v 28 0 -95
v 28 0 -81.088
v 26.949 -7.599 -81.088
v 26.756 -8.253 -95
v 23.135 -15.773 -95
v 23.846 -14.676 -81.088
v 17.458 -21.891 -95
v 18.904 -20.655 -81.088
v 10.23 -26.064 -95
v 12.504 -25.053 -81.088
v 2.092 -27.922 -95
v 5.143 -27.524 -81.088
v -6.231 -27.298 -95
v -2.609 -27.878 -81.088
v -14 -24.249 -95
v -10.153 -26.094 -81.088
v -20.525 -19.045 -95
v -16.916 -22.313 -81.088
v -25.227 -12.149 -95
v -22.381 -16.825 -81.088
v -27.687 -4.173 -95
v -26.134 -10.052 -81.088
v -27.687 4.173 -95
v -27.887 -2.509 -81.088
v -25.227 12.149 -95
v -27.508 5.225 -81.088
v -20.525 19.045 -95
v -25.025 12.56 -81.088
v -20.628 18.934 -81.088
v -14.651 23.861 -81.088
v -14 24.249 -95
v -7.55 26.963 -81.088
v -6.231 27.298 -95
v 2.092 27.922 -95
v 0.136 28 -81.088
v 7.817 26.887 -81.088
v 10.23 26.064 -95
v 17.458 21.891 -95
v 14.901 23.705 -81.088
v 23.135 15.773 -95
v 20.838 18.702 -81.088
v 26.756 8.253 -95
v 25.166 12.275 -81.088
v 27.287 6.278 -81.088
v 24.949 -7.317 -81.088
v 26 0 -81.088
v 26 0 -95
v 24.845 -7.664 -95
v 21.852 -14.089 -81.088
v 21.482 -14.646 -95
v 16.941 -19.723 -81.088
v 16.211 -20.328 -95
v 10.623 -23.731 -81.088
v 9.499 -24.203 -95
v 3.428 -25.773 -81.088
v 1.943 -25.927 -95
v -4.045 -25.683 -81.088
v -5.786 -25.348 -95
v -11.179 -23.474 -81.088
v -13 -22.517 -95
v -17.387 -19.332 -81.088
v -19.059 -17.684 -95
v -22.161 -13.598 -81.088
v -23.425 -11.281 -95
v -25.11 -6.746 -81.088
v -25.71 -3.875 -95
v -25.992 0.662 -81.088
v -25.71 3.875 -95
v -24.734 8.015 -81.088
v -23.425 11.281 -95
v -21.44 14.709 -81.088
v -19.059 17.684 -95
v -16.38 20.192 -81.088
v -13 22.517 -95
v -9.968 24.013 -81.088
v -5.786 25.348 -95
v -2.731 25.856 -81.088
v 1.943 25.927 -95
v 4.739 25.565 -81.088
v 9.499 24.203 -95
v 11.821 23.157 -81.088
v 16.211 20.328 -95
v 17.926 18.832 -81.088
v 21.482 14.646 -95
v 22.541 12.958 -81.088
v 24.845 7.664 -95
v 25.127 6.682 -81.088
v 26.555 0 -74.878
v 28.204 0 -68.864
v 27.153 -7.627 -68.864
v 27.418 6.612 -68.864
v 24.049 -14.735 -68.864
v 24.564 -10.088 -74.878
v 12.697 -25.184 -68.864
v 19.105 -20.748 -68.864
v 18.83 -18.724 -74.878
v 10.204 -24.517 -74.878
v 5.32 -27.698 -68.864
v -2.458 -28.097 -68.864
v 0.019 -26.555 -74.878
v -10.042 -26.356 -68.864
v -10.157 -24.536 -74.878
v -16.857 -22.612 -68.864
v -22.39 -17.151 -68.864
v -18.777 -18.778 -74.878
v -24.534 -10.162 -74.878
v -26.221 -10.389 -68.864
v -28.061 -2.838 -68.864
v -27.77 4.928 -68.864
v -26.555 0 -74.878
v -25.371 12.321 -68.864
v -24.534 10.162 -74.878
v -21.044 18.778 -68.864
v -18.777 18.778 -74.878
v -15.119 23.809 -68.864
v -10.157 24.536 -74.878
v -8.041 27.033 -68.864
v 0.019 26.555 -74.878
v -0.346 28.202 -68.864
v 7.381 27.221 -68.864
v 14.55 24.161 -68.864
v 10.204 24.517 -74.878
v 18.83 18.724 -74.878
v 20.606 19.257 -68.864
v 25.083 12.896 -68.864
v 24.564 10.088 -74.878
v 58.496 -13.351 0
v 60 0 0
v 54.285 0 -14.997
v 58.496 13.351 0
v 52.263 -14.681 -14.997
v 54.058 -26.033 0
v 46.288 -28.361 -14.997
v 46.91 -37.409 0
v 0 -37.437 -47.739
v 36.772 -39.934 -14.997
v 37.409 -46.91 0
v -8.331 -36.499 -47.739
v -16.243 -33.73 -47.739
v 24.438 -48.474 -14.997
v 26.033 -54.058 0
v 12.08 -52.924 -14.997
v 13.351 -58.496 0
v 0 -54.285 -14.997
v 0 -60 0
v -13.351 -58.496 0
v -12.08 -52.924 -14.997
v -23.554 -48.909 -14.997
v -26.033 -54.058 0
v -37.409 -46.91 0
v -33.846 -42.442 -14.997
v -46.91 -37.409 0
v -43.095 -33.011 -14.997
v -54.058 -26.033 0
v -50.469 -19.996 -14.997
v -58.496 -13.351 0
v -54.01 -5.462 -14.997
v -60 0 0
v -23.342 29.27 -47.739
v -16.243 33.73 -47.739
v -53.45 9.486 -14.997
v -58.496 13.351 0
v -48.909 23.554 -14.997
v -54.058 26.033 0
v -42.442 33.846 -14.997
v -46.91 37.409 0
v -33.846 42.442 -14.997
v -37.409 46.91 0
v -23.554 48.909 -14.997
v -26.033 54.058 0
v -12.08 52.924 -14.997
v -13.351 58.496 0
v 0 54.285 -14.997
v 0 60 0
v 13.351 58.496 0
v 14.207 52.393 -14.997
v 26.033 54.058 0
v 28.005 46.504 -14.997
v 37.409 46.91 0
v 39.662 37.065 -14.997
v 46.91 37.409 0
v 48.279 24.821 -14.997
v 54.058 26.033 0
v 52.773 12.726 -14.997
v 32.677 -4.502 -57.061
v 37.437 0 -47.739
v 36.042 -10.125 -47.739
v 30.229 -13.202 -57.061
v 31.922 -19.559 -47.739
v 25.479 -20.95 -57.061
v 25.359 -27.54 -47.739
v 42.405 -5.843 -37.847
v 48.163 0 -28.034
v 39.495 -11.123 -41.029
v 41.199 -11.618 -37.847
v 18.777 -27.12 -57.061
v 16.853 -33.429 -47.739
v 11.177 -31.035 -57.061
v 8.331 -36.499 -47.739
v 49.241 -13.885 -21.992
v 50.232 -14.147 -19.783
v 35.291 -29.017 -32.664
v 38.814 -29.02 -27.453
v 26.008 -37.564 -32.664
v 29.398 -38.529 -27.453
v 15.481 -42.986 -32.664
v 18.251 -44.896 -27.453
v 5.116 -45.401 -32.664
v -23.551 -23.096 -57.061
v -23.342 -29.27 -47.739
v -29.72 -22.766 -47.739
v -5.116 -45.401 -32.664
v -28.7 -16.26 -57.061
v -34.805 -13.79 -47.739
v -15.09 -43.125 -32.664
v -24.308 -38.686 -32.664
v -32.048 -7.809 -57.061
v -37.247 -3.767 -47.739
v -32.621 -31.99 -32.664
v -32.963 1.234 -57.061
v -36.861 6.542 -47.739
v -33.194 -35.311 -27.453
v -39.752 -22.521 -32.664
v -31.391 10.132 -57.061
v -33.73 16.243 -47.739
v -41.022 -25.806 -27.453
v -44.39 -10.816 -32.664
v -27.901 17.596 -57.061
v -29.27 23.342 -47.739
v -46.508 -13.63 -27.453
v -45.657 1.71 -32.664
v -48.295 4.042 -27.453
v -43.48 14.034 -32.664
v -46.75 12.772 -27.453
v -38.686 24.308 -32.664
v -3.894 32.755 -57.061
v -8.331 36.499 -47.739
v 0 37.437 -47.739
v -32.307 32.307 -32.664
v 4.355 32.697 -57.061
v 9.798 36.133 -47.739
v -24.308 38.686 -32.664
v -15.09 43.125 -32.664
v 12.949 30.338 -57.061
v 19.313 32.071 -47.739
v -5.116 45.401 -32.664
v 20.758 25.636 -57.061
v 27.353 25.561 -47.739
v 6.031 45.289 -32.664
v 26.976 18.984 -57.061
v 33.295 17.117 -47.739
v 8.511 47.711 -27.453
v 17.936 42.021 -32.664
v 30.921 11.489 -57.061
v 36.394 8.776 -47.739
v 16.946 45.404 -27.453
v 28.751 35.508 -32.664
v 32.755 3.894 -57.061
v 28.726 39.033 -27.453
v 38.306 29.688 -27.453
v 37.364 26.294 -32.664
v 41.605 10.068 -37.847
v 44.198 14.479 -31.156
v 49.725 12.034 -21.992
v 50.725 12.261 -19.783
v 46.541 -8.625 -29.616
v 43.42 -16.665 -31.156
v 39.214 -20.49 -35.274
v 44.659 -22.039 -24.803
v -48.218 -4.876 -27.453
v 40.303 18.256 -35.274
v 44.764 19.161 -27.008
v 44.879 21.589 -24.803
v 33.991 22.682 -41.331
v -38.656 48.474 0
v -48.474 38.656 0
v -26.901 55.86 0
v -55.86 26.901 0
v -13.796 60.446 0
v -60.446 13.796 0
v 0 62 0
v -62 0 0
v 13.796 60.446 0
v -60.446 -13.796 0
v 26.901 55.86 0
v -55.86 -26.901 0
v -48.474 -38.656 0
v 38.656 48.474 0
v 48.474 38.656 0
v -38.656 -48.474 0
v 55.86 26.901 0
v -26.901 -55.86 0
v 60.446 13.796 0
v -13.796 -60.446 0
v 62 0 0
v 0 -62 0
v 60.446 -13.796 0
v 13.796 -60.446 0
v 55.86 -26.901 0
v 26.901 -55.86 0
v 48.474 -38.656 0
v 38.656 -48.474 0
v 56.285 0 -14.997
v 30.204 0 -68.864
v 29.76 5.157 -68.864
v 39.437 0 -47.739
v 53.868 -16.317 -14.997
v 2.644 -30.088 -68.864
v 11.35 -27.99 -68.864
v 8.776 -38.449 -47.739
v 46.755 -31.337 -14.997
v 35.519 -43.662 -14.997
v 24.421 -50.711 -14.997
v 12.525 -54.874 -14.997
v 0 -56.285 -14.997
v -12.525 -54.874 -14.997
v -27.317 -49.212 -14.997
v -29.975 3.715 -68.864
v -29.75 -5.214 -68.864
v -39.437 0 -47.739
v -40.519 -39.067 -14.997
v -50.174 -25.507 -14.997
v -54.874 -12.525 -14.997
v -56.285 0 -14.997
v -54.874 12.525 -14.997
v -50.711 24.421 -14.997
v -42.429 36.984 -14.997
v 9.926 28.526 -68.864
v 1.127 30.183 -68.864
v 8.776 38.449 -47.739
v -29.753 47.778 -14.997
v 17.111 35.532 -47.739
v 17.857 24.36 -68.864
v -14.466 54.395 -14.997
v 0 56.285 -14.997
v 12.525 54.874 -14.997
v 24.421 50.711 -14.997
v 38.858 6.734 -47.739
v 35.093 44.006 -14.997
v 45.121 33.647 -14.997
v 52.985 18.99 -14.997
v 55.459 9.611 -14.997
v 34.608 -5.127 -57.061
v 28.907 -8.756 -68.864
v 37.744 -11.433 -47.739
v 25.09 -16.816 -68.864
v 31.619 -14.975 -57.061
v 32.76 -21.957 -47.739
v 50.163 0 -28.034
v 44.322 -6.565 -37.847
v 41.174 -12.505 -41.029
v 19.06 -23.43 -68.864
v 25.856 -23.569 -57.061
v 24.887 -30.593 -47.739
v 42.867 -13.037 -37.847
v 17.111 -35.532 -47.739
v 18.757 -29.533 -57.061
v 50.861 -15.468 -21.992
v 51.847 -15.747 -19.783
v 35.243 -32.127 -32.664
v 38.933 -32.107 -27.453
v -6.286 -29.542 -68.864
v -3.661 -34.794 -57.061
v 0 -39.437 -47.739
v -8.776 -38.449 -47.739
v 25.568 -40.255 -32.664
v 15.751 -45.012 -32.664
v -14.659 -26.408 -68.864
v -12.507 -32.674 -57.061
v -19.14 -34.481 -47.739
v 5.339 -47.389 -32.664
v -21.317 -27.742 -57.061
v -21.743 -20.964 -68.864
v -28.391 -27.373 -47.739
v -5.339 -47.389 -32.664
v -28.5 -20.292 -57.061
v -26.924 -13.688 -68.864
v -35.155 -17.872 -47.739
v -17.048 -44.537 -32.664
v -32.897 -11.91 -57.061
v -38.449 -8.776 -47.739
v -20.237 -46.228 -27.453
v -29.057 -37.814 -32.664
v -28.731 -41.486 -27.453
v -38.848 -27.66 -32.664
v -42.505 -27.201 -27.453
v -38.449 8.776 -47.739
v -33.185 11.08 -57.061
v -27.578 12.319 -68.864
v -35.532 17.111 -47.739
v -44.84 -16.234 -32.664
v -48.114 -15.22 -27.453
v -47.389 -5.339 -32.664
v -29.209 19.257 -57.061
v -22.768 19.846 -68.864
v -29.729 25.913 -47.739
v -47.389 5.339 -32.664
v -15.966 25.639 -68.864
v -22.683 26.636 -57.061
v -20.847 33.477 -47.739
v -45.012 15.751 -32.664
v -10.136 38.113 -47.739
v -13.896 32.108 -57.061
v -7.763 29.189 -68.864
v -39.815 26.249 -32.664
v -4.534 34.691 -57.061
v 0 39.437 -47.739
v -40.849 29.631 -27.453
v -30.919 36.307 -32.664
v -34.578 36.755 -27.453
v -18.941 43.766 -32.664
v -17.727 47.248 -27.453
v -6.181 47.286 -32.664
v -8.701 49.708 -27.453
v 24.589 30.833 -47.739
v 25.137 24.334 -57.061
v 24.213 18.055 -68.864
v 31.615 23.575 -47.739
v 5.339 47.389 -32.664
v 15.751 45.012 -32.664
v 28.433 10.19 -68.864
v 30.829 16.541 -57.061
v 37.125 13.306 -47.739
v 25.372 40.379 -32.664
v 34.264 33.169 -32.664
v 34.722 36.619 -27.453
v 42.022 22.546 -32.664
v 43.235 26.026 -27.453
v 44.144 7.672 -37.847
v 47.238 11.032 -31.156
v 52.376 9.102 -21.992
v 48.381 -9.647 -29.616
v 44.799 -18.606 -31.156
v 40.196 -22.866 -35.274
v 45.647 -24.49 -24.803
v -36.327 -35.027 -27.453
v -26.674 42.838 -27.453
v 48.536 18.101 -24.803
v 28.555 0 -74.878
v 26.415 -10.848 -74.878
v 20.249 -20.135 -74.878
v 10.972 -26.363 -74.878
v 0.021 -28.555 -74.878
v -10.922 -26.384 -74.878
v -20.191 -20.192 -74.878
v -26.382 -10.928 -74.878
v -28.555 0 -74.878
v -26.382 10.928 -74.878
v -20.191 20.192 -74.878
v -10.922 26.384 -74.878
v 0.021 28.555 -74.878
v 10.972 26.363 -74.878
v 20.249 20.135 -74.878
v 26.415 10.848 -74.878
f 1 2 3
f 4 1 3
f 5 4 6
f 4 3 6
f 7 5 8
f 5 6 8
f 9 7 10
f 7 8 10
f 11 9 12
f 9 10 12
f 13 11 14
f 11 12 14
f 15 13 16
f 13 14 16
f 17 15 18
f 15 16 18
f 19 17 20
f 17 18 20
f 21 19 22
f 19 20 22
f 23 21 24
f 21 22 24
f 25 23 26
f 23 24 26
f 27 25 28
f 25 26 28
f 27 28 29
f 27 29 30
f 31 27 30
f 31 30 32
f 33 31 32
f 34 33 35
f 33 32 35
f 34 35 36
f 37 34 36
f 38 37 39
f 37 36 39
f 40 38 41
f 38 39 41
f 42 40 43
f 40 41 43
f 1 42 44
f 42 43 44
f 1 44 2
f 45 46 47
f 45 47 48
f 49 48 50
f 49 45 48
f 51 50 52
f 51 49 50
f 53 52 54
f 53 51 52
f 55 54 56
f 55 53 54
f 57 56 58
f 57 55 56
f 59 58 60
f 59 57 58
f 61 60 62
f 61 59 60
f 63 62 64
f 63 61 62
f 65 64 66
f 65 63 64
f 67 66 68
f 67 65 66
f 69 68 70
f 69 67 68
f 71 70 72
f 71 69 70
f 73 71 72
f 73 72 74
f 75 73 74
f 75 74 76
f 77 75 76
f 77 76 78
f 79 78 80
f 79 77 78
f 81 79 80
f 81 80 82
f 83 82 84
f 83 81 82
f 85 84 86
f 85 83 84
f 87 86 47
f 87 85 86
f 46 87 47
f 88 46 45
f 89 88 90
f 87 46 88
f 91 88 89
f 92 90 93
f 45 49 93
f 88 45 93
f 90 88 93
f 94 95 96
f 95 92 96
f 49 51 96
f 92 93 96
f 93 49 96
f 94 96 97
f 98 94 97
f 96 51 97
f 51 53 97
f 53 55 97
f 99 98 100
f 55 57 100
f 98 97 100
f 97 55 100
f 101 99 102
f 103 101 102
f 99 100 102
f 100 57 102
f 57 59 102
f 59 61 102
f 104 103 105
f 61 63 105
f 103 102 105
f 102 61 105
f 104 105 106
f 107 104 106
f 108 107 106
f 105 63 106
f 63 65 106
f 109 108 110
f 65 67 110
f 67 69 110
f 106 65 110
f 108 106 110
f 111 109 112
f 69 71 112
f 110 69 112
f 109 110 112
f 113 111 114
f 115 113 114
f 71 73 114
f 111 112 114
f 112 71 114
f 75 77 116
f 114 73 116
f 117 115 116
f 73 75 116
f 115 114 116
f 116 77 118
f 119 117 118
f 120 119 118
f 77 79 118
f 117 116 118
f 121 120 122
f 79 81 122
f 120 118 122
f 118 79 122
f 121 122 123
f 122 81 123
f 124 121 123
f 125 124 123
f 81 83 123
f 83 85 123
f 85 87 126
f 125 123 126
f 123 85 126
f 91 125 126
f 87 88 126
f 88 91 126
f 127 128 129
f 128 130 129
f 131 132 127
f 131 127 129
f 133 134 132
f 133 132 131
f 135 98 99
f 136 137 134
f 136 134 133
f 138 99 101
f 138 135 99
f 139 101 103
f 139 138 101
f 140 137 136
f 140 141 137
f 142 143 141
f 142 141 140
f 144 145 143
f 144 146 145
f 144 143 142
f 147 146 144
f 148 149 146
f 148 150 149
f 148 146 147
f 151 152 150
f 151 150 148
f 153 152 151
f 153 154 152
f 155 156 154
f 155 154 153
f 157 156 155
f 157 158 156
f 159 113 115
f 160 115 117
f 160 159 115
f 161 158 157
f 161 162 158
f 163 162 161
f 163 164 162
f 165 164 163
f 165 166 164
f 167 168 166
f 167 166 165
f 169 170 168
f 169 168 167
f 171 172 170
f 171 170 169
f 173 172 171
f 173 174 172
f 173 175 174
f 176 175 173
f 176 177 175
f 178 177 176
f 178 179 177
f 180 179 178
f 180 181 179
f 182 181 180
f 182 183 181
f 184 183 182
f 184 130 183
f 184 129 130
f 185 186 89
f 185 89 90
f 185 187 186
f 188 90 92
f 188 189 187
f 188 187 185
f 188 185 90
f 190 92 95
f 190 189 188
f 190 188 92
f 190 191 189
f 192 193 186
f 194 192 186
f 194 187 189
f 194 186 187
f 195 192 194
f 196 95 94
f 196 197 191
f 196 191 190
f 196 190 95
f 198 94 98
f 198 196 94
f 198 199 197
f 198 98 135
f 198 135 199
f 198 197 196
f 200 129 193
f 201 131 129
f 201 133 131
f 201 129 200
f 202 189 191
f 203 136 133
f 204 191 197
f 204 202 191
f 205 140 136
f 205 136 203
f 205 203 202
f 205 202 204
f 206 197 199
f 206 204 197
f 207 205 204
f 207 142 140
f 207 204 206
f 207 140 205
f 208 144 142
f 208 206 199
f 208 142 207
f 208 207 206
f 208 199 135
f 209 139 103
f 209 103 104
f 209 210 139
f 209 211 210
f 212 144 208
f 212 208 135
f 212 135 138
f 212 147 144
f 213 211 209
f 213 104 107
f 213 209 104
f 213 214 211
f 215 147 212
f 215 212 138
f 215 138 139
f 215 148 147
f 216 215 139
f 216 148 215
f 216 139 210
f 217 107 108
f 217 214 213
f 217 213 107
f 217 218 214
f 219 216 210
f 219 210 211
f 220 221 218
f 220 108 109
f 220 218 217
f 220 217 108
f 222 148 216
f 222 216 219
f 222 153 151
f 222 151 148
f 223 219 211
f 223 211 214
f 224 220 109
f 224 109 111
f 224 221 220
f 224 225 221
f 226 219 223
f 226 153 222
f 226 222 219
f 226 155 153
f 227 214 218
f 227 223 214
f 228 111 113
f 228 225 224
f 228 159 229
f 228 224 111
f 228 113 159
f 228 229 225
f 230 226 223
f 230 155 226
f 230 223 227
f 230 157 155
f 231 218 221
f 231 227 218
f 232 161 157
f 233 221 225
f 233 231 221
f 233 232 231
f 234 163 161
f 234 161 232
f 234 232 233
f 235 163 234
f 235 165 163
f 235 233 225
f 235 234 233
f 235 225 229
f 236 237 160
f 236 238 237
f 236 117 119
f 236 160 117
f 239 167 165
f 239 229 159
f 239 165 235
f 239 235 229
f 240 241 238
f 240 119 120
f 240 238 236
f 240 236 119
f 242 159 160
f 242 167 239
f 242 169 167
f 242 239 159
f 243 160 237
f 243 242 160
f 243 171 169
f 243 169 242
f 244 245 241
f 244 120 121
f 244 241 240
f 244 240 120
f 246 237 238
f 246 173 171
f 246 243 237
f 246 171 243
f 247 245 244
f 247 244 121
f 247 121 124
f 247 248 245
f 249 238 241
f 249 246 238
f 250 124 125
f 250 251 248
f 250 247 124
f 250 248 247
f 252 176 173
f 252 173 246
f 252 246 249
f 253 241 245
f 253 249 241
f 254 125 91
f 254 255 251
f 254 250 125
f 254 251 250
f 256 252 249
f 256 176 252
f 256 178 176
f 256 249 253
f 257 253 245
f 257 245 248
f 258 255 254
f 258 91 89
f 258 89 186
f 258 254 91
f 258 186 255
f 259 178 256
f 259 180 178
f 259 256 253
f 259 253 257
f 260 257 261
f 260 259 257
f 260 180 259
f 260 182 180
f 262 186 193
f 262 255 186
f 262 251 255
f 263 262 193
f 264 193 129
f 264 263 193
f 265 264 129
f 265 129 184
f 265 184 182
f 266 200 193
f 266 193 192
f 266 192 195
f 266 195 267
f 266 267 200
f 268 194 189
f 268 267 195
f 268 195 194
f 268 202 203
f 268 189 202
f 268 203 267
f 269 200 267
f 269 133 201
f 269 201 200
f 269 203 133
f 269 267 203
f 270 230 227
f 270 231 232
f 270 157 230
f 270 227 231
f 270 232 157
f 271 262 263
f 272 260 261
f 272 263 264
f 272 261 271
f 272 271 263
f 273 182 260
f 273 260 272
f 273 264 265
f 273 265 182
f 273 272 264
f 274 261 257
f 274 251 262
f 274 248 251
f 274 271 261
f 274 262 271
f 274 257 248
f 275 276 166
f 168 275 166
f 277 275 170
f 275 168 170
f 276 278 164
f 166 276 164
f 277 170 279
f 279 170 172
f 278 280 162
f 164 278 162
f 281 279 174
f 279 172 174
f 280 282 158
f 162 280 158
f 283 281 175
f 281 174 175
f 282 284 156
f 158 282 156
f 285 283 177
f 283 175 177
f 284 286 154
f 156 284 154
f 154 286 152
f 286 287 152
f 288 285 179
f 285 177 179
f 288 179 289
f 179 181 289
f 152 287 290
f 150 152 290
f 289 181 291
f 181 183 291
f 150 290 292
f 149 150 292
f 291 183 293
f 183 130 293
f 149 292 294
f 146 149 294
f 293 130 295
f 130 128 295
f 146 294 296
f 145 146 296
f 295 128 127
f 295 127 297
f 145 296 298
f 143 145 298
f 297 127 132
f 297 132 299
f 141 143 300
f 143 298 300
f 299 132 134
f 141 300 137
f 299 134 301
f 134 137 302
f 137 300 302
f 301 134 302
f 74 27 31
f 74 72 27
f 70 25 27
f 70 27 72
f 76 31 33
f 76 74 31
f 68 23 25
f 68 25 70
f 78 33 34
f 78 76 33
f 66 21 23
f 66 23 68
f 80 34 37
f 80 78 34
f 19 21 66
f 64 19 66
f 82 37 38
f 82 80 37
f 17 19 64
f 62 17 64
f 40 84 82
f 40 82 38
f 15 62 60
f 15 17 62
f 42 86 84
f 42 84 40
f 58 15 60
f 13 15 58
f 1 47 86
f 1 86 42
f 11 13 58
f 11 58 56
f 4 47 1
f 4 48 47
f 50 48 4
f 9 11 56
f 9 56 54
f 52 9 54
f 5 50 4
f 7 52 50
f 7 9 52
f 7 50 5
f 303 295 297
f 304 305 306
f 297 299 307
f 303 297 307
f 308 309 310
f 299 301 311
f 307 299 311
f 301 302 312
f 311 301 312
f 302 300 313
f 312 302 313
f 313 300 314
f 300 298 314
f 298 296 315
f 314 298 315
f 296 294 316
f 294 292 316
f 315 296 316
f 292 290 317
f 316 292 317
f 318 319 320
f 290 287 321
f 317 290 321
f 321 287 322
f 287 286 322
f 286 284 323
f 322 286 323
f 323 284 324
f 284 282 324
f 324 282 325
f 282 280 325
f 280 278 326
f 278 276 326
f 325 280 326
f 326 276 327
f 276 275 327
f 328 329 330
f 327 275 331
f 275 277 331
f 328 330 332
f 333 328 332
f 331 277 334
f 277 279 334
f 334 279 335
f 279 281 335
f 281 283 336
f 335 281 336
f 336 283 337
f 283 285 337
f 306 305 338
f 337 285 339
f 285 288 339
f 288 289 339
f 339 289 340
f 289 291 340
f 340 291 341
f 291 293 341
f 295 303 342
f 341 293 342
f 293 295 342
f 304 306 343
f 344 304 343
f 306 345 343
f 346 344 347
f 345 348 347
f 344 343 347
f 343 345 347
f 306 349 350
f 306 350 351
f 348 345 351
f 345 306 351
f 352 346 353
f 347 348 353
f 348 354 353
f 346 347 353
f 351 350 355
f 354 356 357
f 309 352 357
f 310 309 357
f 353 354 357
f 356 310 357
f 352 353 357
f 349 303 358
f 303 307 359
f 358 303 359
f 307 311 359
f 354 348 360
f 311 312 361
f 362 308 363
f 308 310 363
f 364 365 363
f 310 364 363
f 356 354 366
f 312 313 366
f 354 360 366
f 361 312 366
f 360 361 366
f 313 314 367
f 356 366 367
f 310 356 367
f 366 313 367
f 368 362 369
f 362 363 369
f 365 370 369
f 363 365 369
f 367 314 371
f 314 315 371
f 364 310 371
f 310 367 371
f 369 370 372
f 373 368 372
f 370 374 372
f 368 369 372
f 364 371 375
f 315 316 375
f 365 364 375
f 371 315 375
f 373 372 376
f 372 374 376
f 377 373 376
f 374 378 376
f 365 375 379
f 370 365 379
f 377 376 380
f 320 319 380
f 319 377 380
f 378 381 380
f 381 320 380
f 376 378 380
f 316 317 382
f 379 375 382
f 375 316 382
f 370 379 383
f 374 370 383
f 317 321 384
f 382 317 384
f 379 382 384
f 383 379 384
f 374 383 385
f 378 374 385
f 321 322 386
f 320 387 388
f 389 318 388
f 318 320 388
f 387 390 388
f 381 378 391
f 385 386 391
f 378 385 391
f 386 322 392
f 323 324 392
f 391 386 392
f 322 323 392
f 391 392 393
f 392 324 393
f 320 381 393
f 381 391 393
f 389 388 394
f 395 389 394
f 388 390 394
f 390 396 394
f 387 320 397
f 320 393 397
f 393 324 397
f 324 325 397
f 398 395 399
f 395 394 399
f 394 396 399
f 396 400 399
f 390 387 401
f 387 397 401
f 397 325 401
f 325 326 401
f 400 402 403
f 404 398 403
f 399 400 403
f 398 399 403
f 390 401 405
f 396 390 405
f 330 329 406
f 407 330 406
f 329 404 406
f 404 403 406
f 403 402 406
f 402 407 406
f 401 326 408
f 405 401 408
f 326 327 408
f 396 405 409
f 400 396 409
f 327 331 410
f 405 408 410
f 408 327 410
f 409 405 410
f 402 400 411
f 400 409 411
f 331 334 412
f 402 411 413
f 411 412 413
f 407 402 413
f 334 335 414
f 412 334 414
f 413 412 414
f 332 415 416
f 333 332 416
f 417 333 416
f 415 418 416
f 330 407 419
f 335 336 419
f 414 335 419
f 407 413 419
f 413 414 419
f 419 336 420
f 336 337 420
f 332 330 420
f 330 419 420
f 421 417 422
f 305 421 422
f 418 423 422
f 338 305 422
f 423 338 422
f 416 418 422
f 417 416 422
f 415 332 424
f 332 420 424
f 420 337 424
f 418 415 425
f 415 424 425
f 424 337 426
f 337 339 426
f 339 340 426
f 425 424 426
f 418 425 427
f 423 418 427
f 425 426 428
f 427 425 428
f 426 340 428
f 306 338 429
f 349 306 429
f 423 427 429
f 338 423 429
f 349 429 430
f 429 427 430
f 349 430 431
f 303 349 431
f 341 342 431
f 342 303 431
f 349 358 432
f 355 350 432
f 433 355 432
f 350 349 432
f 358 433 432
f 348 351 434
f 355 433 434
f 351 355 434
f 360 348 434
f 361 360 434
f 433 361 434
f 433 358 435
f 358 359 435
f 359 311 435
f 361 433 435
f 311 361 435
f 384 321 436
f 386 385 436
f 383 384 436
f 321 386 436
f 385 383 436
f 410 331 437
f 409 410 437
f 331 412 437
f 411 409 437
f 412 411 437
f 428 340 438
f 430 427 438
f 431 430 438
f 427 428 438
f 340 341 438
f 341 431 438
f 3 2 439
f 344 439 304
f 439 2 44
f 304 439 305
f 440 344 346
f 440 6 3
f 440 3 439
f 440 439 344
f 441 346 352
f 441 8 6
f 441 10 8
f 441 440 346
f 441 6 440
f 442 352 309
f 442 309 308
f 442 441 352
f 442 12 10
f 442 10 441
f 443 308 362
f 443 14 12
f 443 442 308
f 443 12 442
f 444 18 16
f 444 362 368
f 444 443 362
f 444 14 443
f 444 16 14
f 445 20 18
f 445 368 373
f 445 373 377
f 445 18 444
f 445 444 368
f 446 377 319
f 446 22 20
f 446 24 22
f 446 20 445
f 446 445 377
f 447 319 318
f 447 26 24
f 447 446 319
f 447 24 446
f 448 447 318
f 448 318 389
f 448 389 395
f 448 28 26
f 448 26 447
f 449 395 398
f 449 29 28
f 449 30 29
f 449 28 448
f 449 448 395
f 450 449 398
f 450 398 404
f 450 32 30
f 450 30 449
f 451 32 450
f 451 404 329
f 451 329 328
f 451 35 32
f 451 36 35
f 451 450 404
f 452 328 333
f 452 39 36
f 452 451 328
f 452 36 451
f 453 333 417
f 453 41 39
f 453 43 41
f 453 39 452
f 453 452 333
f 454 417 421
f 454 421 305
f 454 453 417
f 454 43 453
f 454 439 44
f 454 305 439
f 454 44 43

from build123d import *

# Parameters (mm, degrees)
F2_R     = 28
F2_R_2   = 26
F3_DEPTH = 20
F4_R     = 35


# Not quite as in the source:
# - a feature names something its author has since deleted; it is built from what else it names


with BuildPart() as f1:
    # F0 (on Front) → F1 (revolve)
    with BuildSketch(Plane.XZ):
        with BuildLine():
            add(Edge.make_bspline(
                [(26, -75), (32.5, -56.25), (43, -37.5), (53.5, -18.75), (60, 0)],
                knots=[0, 0, 0, 0, 0.5, 1, 1, 1, 1], degree=3))
            Line((26, -75), (28, -75))
            add(Edge.make_bspline(
                [(28, -75), (34.5, -56.25), (45, -37.5), (55.5, -18.75), (62, 0)],
                knots=[0, 0, 0, 0, 0.5, 1, 1, 1, 1], degree=3))
            Line((62, 0), (60, 0))
        make_face()
    revolve(axis=Axis((0, 0, -37.5), (0, 0, -1)))

    # F2 (on face) → F3 (join)
    with BuildSketch(Plane(origin=(0, 0, -75), x_dir=(1, 0, 0), z_dir=(0, 0, -1))):
        Circle(F2_R)
        Circle(F2_R_2, mode=Mode.SUBTRACT)
    extrude(amount=F3_DEPTH)

    # F4
    f4_edges = [f1.edges().sort_by_distance(p)[0] for p in [
        (-26, 0, -75),
        (-28, 0, -75),
    ]]
    fillet(f4_edges, radius=F4_R)


solid = f1.part
